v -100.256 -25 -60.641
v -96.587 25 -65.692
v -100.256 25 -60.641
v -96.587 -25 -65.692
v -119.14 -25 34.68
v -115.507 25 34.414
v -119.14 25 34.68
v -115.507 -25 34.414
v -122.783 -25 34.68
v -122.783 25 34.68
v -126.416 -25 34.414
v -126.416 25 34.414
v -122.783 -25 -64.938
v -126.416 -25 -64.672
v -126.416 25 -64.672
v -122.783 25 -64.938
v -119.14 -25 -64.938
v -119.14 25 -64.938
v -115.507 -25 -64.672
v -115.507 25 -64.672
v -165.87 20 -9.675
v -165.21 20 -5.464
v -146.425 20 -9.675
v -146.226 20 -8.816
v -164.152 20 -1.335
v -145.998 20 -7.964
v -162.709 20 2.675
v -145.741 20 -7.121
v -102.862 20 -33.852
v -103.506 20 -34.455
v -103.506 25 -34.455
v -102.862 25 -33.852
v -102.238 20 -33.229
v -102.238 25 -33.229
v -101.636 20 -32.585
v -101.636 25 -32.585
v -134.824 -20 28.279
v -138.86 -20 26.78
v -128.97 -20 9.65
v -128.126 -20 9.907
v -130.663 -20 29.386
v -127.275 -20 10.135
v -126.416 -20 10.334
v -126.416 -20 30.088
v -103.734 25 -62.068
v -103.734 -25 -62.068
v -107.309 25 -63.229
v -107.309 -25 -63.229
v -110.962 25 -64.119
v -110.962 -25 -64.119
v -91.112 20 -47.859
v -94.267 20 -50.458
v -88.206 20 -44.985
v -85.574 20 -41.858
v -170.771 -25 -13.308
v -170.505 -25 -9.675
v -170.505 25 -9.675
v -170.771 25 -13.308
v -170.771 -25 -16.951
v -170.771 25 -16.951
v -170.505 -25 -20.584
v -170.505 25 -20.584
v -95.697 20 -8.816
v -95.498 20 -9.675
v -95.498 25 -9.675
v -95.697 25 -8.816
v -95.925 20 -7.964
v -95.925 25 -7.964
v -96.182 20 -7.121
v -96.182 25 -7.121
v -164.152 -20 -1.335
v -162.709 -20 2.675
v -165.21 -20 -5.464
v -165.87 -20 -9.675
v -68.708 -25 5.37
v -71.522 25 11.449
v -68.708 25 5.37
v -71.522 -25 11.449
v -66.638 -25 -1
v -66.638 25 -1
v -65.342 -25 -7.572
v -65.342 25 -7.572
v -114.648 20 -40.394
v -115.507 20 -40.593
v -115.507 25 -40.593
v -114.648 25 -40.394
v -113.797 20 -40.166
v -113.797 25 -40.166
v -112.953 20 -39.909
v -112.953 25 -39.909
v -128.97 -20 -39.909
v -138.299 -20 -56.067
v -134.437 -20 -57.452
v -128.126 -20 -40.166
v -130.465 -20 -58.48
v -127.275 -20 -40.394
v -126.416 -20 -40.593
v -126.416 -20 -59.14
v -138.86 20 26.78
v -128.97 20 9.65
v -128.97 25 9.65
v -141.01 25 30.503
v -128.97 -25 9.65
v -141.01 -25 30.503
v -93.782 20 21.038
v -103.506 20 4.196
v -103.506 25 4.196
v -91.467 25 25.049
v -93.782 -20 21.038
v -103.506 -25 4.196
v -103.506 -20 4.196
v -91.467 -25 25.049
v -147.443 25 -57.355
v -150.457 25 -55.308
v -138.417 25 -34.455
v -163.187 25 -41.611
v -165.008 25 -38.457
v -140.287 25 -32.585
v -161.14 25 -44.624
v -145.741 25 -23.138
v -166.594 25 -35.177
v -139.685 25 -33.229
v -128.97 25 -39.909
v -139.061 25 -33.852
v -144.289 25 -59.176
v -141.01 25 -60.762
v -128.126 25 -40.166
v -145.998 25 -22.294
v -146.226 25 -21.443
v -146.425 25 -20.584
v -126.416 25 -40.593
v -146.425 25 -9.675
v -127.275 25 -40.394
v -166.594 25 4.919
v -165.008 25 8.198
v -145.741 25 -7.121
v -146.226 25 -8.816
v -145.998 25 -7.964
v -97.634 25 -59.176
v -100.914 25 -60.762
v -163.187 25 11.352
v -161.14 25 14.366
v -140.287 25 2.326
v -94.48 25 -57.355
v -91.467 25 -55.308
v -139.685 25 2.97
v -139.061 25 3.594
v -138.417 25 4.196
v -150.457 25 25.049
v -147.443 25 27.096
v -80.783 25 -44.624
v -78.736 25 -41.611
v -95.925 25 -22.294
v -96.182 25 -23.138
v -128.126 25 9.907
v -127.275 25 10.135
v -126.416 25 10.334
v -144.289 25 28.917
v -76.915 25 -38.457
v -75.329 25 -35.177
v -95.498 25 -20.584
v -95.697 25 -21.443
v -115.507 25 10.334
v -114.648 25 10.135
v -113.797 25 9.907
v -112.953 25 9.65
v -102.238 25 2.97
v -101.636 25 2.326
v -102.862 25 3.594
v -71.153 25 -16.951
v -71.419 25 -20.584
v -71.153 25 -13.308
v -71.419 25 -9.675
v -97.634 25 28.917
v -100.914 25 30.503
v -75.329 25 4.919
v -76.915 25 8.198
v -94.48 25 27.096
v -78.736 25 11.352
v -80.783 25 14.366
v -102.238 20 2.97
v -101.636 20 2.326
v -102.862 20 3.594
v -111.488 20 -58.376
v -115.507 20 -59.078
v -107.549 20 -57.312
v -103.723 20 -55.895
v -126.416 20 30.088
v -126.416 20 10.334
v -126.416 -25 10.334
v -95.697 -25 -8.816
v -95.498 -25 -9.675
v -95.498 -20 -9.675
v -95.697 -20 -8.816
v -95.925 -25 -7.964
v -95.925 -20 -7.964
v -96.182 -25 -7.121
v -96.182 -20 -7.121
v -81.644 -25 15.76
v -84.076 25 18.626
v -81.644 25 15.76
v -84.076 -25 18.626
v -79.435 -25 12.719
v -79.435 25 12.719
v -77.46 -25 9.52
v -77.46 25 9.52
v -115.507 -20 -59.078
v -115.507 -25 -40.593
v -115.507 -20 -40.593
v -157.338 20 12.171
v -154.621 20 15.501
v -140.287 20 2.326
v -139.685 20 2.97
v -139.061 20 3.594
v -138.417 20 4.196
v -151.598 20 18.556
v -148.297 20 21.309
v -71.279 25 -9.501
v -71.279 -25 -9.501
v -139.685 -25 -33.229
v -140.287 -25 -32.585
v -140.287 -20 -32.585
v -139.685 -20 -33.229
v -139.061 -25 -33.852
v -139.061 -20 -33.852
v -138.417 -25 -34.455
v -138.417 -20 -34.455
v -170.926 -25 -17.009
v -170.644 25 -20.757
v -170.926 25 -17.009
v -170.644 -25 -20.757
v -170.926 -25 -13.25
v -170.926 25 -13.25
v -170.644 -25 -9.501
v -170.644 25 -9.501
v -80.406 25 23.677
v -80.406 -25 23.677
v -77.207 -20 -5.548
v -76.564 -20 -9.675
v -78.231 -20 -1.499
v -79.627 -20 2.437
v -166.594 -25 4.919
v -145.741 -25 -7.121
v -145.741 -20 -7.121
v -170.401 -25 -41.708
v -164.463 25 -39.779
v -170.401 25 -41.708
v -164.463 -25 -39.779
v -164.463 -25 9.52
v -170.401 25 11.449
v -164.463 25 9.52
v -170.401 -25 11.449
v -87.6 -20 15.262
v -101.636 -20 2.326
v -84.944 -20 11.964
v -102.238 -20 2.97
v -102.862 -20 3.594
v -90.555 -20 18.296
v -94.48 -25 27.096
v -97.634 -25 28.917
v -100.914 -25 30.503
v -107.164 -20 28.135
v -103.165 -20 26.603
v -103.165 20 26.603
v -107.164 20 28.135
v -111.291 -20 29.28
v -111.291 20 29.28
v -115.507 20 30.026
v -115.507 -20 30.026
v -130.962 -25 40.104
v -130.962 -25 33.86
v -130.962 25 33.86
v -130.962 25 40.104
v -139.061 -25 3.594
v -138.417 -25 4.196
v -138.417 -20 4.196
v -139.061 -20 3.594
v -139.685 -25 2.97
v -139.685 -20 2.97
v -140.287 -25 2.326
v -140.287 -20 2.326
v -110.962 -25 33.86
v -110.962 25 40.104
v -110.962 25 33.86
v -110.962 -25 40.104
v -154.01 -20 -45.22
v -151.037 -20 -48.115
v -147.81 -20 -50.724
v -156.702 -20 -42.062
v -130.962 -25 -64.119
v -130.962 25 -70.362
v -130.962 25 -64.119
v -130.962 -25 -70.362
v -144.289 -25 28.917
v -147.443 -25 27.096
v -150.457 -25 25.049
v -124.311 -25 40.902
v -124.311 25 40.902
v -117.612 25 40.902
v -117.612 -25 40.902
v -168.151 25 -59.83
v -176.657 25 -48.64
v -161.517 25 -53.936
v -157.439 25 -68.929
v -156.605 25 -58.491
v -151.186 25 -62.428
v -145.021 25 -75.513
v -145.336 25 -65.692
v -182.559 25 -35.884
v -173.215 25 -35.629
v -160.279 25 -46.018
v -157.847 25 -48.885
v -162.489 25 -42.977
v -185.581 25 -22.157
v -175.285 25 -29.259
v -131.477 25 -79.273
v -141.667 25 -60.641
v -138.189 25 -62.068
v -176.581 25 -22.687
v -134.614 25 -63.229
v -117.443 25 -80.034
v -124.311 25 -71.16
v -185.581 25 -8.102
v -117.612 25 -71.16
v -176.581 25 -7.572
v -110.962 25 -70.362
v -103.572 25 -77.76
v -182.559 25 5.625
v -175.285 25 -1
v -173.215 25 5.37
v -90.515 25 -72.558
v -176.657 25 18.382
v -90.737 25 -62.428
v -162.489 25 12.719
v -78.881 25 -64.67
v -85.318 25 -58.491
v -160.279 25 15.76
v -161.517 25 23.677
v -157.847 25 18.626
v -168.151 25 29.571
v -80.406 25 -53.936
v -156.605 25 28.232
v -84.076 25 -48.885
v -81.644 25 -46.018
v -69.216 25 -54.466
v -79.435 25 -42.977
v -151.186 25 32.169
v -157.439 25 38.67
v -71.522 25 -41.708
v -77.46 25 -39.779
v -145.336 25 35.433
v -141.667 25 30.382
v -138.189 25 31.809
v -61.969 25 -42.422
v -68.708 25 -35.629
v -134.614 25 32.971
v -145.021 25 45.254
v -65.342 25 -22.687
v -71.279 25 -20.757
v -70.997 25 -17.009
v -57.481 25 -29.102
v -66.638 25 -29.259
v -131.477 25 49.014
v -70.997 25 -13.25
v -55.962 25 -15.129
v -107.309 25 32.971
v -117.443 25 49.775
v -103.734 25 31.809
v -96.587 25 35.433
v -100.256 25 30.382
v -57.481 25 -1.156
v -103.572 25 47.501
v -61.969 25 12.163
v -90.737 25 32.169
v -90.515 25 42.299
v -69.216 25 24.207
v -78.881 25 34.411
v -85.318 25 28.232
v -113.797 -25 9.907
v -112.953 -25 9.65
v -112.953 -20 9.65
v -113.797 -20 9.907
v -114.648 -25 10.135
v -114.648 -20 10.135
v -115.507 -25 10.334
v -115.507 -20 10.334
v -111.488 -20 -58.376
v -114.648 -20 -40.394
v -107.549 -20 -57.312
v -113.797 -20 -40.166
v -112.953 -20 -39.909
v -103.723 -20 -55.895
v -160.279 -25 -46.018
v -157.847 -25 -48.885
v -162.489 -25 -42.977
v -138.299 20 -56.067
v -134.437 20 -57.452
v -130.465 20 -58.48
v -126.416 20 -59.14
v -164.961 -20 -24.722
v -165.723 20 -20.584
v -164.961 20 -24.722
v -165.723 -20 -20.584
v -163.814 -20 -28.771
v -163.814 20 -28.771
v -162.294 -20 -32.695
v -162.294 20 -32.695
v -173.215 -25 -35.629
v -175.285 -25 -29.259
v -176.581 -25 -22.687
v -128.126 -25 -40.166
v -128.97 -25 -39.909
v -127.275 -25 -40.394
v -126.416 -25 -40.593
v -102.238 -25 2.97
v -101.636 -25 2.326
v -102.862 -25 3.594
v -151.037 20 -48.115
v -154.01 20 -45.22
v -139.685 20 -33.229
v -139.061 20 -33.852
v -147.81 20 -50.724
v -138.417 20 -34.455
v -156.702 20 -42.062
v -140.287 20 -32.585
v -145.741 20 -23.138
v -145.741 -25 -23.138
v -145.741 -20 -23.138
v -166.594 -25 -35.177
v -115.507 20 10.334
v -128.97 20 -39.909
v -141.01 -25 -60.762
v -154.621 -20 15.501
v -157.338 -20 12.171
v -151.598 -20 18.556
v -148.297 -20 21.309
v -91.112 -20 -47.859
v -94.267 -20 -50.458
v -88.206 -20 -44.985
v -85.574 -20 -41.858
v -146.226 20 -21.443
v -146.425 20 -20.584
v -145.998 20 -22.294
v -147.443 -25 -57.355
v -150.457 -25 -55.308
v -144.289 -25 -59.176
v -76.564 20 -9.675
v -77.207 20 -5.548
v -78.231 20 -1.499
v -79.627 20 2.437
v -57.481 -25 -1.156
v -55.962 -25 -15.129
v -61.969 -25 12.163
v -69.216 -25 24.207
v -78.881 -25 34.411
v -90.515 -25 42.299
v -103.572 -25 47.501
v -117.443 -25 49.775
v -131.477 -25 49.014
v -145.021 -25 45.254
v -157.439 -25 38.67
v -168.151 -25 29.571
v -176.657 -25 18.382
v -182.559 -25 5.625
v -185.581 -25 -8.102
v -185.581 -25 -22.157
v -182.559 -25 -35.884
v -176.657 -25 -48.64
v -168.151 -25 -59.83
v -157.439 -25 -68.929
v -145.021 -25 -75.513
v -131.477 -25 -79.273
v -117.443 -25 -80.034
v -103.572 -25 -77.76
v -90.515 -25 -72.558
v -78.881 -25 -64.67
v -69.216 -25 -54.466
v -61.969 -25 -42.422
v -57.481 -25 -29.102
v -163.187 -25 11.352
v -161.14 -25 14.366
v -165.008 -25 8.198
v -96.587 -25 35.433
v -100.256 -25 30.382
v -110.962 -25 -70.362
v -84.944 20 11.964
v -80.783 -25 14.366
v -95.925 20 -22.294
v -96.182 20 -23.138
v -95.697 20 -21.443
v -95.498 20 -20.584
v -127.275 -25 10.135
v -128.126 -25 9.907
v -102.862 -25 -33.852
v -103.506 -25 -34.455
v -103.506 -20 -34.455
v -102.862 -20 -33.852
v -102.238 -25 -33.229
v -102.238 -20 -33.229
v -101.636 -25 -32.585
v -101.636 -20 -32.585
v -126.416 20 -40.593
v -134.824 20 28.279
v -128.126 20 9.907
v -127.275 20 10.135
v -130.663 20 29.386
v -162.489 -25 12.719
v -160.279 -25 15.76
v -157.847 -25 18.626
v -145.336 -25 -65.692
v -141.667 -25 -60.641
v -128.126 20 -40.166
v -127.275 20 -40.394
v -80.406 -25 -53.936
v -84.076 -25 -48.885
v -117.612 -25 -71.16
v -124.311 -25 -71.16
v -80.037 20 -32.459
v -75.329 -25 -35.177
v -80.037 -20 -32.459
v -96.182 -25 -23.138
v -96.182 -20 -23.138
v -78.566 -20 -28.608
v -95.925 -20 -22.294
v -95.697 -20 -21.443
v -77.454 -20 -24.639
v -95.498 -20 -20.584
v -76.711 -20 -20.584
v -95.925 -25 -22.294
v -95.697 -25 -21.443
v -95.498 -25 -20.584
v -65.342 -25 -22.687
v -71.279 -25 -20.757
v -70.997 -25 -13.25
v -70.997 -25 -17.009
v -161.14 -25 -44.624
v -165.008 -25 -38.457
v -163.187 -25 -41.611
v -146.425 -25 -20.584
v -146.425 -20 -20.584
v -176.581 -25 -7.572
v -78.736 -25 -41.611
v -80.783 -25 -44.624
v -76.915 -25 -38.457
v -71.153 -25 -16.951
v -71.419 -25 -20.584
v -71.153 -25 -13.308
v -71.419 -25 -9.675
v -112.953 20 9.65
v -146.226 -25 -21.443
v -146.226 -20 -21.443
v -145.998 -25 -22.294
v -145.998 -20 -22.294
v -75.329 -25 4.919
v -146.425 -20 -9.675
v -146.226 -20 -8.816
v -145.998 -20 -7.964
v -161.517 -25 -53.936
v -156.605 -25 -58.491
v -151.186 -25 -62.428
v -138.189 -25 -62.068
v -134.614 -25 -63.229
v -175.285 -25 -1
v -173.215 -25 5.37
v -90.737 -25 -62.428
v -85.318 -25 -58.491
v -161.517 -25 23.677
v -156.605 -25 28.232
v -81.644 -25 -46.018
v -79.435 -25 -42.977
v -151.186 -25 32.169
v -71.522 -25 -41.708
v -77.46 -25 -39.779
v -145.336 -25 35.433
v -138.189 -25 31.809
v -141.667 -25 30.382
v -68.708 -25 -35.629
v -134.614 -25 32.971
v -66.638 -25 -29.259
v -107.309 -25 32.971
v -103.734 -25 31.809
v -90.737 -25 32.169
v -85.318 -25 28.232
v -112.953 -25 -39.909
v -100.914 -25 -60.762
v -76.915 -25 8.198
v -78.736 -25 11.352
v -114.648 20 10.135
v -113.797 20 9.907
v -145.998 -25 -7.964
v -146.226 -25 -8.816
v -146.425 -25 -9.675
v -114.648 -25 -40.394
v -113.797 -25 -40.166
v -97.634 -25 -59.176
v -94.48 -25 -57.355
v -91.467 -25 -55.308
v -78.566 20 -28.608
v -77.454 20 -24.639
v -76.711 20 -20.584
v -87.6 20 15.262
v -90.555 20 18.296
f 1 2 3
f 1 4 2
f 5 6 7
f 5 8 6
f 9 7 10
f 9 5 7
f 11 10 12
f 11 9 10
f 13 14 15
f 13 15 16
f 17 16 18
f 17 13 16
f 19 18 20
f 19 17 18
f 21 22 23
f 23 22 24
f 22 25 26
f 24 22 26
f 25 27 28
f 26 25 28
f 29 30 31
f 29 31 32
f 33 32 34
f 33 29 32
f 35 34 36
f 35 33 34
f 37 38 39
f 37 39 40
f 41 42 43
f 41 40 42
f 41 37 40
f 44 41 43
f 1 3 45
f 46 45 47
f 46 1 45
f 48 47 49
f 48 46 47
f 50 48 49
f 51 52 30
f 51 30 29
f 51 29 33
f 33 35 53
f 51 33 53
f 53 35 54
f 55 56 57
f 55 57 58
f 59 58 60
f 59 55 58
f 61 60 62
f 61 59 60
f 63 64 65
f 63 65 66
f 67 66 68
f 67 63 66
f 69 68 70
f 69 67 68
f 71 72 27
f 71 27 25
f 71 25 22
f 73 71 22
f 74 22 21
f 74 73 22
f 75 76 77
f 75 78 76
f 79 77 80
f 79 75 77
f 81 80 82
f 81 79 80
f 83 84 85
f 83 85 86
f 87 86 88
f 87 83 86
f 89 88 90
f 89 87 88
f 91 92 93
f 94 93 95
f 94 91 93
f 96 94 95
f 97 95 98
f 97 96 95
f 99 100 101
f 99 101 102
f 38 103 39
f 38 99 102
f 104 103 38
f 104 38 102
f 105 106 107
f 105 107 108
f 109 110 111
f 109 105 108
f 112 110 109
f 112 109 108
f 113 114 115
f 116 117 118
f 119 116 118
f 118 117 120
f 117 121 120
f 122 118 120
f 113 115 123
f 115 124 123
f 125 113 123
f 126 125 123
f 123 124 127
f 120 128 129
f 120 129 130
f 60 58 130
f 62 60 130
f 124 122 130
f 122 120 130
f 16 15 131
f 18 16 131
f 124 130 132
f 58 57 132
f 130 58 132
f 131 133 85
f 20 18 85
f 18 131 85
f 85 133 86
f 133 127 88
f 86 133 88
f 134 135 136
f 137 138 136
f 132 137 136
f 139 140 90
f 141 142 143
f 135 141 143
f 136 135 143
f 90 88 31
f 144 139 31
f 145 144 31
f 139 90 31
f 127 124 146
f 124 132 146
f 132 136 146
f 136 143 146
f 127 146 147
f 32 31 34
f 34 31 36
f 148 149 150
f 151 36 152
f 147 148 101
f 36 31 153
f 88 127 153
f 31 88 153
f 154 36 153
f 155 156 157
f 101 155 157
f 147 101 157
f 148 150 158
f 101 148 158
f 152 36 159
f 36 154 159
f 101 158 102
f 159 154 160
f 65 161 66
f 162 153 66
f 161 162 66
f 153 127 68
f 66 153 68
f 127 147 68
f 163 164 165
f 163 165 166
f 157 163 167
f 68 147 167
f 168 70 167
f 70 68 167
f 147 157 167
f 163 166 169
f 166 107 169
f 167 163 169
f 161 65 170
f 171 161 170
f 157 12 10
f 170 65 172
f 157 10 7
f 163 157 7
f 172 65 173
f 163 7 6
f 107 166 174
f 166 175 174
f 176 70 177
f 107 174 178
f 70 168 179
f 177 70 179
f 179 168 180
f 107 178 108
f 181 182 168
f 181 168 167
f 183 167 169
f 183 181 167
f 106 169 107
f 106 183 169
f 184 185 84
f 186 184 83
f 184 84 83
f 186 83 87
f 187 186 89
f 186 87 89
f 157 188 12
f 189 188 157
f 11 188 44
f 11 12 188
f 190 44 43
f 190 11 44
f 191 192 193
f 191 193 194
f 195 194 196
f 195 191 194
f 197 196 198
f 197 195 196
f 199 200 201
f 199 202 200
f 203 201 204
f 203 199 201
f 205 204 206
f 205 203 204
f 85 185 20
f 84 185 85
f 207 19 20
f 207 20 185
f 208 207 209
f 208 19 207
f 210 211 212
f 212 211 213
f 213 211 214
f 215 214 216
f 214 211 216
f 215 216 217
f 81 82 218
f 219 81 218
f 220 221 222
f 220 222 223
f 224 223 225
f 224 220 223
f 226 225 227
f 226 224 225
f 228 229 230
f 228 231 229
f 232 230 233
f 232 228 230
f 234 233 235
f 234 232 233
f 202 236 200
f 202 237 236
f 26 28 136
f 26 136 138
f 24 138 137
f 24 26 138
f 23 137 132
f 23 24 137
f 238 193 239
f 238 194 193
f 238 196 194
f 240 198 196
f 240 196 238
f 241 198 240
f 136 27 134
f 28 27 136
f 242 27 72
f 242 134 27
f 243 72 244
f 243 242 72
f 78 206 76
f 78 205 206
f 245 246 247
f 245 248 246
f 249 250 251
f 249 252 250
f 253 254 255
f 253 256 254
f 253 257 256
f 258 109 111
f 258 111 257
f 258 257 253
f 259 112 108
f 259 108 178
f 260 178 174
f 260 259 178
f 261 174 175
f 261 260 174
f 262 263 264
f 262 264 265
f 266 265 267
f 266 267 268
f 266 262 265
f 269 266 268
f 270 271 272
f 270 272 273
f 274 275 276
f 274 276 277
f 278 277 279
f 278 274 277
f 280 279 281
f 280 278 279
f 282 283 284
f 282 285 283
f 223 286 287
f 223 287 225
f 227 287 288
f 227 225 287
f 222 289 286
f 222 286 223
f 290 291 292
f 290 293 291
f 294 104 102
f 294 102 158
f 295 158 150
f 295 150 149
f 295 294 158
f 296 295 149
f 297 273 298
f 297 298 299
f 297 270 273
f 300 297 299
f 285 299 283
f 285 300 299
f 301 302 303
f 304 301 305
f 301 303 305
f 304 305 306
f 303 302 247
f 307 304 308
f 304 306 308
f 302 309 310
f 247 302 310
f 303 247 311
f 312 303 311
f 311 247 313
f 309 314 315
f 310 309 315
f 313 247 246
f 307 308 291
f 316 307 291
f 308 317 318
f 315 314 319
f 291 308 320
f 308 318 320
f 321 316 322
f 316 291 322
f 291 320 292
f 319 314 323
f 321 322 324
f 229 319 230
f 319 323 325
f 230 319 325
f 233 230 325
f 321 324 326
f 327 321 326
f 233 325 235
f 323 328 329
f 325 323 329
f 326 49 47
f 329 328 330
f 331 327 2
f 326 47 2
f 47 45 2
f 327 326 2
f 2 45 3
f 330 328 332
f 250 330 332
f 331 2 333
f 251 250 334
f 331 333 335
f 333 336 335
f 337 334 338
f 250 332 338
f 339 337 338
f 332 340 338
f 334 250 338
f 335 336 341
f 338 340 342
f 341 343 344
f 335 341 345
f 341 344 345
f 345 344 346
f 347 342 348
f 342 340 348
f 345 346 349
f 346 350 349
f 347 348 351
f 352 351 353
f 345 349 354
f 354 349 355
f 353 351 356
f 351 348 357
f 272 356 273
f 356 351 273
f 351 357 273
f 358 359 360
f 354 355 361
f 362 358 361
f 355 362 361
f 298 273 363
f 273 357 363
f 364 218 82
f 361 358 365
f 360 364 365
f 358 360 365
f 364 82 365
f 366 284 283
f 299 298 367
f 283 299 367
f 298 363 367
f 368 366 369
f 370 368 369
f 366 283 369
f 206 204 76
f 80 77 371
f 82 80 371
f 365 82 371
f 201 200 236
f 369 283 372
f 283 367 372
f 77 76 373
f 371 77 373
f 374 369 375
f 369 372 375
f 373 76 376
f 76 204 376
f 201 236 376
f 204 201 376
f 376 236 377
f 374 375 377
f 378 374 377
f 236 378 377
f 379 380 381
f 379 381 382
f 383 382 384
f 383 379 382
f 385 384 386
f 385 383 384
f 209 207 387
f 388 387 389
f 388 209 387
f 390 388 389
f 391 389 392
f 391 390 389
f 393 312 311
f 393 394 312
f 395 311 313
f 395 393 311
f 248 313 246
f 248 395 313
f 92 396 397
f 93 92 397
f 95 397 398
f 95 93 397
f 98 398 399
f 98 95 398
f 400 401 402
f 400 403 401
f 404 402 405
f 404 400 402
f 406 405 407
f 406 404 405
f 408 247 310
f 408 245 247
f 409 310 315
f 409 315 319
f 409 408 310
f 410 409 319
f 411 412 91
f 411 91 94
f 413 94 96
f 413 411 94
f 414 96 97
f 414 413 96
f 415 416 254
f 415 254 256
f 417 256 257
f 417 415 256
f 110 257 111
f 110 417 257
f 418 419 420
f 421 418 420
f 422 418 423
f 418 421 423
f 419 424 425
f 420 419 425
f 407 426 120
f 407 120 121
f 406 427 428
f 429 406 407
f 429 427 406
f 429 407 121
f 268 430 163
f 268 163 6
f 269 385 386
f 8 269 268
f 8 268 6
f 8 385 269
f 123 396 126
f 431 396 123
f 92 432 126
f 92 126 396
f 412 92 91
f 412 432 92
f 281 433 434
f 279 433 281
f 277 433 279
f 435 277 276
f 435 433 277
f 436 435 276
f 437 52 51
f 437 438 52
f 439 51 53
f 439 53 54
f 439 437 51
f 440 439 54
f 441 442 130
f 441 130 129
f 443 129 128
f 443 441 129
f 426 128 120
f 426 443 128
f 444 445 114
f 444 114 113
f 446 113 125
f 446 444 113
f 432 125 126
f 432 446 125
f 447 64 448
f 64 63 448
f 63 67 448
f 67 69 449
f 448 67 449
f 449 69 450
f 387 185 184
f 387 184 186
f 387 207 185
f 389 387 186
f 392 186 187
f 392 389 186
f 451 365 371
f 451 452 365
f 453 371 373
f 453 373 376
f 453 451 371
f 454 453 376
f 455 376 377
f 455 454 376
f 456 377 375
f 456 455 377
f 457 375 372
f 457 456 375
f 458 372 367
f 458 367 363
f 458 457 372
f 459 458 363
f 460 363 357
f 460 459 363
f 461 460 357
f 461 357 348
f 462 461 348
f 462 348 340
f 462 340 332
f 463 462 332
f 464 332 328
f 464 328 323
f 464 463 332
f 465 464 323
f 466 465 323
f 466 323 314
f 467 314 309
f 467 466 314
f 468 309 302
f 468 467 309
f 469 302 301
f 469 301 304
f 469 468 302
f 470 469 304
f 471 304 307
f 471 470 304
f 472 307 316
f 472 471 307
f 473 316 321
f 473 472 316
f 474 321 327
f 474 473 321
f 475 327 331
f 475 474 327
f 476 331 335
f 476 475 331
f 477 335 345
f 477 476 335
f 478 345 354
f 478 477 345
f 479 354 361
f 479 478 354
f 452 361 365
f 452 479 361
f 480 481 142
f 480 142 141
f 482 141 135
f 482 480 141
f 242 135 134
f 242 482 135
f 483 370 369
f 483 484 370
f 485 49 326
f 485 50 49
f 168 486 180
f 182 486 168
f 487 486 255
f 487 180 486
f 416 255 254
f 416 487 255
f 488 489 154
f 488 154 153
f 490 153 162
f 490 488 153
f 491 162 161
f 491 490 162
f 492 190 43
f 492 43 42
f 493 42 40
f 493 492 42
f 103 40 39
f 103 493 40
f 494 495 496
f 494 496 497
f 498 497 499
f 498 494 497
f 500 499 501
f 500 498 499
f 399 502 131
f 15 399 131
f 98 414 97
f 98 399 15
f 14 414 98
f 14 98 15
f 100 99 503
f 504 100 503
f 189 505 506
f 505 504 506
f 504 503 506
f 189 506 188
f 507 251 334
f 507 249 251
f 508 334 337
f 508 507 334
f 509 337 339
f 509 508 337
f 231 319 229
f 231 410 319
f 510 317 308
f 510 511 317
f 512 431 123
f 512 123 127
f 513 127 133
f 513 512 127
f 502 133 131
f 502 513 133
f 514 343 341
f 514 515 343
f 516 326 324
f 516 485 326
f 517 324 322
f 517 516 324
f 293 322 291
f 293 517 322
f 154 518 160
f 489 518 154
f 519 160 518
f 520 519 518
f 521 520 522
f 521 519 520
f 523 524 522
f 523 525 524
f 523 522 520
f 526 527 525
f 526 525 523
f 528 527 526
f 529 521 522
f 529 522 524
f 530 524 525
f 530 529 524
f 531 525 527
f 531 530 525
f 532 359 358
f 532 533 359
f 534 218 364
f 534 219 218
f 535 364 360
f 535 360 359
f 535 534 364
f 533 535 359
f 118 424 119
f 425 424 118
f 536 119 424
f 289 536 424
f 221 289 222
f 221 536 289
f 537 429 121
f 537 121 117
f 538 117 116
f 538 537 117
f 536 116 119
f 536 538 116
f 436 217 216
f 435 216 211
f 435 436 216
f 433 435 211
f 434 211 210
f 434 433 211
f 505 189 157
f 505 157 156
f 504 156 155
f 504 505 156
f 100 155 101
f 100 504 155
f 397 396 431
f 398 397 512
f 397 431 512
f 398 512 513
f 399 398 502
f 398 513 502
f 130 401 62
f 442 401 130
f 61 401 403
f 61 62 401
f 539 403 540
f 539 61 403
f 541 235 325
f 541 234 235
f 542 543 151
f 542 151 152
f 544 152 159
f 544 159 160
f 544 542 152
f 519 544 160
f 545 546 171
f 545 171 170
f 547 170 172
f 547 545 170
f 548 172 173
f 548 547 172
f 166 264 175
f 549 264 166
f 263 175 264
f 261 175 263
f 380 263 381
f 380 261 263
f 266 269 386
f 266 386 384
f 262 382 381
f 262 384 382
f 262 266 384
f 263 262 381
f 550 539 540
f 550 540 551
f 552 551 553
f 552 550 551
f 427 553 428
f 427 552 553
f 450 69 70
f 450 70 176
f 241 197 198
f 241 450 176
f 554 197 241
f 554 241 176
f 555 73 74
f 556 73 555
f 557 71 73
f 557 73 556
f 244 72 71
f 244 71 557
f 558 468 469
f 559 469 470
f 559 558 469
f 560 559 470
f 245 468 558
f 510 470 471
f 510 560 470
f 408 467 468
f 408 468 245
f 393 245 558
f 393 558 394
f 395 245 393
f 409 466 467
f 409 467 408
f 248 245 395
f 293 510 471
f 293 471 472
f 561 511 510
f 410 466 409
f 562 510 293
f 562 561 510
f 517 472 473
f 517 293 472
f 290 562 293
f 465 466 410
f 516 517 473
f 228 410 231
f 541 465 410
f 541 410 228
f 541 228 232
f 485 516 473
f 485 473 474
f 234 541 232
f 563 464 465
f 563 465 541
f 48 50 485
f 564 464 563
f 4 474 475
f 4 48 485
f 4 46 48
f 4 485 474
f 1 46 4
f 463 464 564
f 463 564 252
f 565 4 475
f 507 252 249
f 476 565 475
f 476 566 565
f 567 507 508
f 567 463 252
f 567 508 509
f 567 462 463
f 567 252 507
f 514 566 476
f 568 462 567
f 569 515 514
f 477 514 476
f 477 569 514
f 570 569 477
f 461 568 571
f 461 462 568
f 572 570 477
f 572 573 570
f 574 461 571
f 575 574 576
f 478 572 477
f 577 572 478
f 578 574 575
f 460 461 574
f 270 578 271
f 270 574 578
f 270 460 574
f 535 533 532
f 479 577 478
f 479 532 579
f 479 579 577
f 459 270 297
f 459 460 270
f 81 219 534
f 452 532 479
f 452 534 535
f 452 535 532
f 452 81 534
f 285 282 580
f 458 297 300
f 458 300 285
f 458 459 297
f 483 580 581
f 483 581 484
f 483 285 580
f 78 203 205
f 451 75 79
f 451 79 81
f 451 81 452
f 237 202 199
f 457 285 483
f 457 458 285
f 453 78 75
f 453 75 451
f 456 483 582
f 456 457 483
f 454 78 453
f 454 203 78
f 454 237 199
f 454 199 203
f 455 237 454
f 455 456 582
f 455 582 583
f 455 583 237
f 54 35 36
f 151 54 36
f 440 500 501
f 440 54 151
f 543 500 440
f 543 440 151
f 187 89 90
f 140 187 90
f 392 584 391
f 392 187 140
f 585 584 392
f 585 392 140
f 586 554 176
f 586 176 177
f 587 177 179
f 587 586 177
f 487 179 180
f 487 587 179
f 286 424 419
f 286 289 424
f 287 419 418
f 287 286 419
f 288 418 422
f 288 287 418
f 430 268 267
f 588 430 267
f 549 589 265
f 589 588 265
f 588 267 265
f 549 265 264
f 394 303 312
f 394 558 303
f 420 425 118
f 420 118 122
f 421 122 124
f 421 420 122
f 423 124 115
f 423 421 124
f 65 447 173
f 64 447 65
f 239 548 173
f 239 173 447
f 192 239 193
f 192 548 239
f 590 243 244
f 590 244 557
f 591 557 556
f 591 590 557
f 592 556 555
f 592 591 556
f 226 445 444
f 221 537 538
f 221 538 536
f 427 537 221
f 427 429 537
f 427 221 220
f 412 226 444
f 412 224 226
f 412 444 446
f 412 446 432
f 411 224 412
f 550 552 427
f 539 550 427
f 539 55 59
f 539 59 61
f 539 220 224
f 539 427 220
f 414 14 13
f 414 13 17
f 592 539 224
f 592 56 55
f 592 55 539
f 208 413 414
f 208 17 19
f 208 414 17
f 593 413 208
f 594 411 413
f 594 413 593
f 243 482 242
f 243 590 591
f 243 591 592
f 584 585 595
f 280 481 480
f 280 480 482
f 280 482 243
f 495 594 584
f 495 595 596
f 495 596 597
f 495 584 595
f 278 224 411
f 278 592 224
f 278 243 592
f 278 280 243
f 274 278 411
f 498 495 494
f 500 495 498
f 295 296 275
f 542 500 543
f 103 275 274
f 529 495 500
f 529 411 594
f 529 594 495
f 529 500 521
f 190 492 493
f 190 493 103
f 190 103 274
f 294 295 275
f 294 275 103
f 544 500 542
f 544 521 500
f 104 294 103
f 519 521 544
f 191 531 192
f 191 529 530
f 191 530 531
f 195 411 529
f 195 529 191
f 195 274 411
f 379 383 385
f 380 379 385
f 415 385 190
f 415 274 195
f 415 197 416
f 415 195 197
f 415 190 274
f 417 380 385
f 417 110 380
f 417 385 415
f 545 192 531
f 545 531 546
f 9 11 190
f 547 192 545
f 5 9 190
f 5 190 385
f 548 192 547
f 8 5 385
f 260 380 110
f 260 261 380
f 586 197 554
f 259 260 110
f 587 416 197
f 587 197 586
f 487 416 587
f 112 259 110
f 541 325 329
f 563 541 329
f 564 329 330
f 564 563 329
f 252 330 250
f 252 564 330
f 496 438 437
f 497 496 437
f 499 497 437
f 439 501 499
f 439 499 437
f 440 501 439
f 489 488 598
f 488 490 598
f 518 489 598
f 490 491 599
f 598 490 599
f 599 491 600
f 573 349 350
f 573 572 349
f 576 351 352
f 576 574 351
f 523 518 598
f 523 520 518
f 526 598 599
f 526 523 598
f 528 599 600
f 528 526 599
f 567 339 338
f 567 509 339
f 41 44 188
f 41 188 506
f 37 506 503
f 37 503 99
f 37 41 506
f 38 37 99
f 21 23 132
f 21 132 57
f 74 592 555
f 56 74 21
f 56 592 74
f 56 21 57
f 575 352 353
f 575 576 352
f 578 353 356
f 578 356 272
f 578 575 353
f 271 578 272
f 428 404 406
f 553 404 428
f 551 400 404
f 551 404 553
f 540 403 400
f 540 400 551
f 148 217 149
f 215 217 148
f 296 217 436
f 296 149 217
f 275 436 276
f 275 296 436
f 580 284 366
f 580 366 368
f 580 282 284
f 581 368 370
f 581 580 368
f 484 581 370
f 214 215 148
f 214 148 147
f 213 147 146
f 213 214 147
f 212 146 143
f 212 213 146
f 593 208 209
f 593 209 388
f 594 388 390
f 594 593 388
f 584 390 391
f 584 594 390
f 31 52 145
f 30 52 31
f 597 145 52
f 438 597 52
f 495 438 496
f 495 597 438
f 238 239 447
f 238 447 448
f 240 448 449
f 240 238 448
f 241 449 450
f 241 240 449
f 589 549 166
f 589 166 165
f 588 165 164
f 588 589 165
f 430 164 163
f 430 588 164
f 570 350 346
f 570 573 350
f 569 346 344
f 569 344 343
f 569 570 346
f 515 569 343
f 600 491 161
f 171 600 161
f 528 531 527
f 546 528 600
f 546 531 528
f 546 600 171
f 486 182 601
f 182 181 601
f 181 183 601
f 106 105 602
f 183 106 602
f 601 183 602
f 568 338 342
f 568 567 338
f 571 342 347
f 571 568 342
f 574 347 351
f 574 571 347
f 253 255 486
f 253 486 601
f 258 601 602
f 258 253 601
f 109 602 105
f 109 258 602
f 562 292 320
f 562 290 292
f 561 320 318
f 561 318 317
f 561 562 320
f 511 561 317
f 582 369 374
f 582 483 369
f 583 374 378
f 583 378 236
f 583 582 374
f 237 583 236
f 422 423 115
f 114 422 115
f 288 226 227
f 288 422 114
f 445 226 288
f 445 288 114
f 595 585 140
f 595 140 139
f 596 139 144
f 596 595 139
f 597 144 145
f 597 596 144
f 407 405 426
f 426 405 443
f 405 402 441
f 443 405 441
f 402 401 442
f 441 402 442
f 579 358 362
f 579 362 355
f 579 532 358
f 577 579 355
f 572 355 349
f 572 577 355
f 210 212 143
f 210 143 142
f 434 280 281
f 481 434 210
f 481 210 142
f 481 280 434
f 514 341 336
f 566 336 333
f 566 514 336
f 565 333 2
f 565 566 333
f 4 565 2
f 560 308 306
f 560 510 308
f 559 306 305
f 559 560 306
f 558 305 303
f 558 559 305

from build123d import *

# Parameters (mm, degrees)
F0_R     = 65
F2_DEPTH = 25
F3_DEPTH = 25
F1_R     = 44.916046
F4_DEPTH = 20


with BuildPart() as f2:
    # F0 (on Front) → F2 (new body, symmetric)
    with BuildSketch(Plane.XZ):
        with Locations((-120.961553, -15.129341)):
            Circle(F0_R)
        with BuildLine():
            Line((-130.961553, 33.860454), (-130.961553, 40.103608))
            ThreePointArc((-130.961553, 40.103608), (-120.961553, 41.001566), (-110.961553, 40.103608))
            Line((-110.961553, 40.103608), (-110.961553, 33.860454))
            ThreePointArc((-110.961553, 33.860454), (-105.510703, 32.423485), (-100.256244, 30.382088))
            Line((-100.256244, 30.382088), (-96.58661, 35.432906))
            ThreePointArc((-96.58661, 35.432906), (-87.968634, 30.281516), (-80.40627, 23.677201))
            Line((-80.40627, 23.677201), (-84.075904, 18.626383))
            ThreePointArc((-84.075904, 18.626383), (-80.510703, 14.259922), (-77.45966, 9.519904))
            Line((-77.45966, 9.519904), (-71.522067, 11.449144))
            ThreePointArc((-71.522067, 11.449144), (-67.577889, 2.216063), (-65.341727, -7.571986))
            Line((-65.341727, -7.571986), (-71.27932, -9.501227))
            ThreePointArc((-71.27932, -9.501227), (-70.961553, -15.129341), (-71.27932, -20.757455))
            Line((-71.27932, -20.757455), (-65.341727, -22.686696))
            ThreePointArc((-65.341727, -22.686696), (-67.577889, -32.474745), (-71.522067, -41.707826))
            Line((-71.522067, -41.707826), (-77.45966, -39.778585))
            ThreePointArc((-77.45966, -39.778585), (-80.510703, -44.518603), (-84.075904, -48.885065))
            Line((-84.075904, -48.885065), (-80.40627, -53.935883))
            ThreePointArc((-80.40627, -53.935883), (-87.968634, -60.540198), (-96.58661, -65.691588))
            Line((-96.58661, -65.691588), (-100.256244, -60.64077))
            ThreePointArc((-100.256244, -60.64077), (-105.510703, -62.682167), (-110.961553, -64.119136))
            Line((-110.961553, -64.119136), (-110.961553, -70.36229))
            ThreePointArc((-110.961553, -70.36229), (-120.961553, -71.260247), (-130.961553, -70.36229))
            Line((-130.961553, -70.36229), (-130.961553, -64.119136))
            ThreePointArc((-130.961553, -64.119136), (-136.412403, -62.682167), (-141.666862, -60.64077))
            Line((-141.666862, -60.64077), (-145.336496, -65.691588))
            ThreePointArc((-145.336496, -65.691588), (-153.954472, -60.540198), (-161.516836, -53.935883))
            Line((-161.516836, -53.935883), (-157.847202, -48.885065))
            ThreePointArc((-157.847202, -48.885065), (-161.412403, -44.518603), (-164.463447, -39.778585))
            Line((-164.463447, -39.778585), (-170.401039, -41.707826))
            ThreePointArc((-170.401039, -41.707826), (-174.345218, -32.474745), (-176.581379, -22.686696))
            Line((-176.581379, -22.686696), (-170.643787, -20.757455))
            ThreePointArc((-170.643787, -20.757455), (-170.961553, -15.129341), (-170.643787, -9.501227))
            Line((-170.643787, -9.501227), (-176.581379, -7.571986))
            ThreePointArc((-176.581379, -7.571986), (-174.345218, 2.216063), (-170.401039, 11.449144))
            Line((-170.401039, 11.449144), (-164.463447, 9.519904))
            ThreePointArc((-164.463447, 9.519904), (-161.412403, 14.259922), (-157.847202, 18.626383))
            Line((-157.847202, 18.626383), (-161.516836, 23.677201))
            ThreePointArc((-161.516836, 23.677201), (-153.954472, 30.281516), (-145.336496, 35.432906))
            Line((-145.336496, 35.432906), (-141.666862, 30.382088))
            ThreePointArc((-141.666862, 30.382088), (-136.412403, 32.423485), (-130.961553, 33.860454))
        make_face(mode=Mode.SUBTRACT)
    extrude(amount=F2_DEPTH, both=True)


with BuildPart() as f3:
    # F0 (on Front) → F3 (new body, symmetric)
    with BuildSketch(Plane.XZ):
        with BuildLine():
            Line((-126.415759, 34.413607), (-126.415759, 32.423485))
            Line((-126.415759, 32.423485), (-126.415759, 10.334424))
            ThreePointArc((-126.415759, 10.334424), (-127.701549, 10.024668), (-128.969955, 9.65003))
            Line((-128.969955, 9.65003), (-141.009546, 30.503213))
            ThreePointArc((-141.009546, 30.503213), (-145.882689, 28.035332), (-150.456508, 25.049007))
            Line((-150.456508, 25.049007), (-138.416917, 4.195824))
            ThreePointArc((-138.416917, 4.195824), (-139.375565, 3.284671), (-140.286718, 2.326023))
            Line((-140.286718, 2.326023), (-161.139901, 14.365614))
            ThreePointArc((-161.139901, 14.365614), (-164.126226, 9.791795), (-166.594107, 4.918652))
            Line((-166.594107, 4.918652), (-145.740924, -7.120939))
            ThreePointArc((-145.740924, -7.120939), (-146.115562, -8.389345), (-146.425318, -9.675135))
            Line((-146.425318, -9.675135), (-170.504501, -9.675135))
            ThreePointArc((-170.504501, -9.675135), (-170.803824, -15.129341), (-170.504501, -20.583547))
            Line((-170.504501, -20.583547), (-146.425318, -20.583547))
            ThreePointArc((-146.425318, -20.583547), (-146.115562, -21.869337), (-145.740924, -23.137742))
            Line((-145.740924, -23.137742), (-166.594107, -35.177333))
            ThreePointArc((-166.594107, -35.177333), (-164.126226, -40.050476), (-161.139901, -44.624296))
            Line((-161.139901, -44.624296), (-140.286718, -32.584704))
            ThreePointArc((-140.286718, -32.584704), (-139.375565, -33.543353), (-138.416917, -34.454505))
            Line((-138.416917, -34.454505), (-150.456508, -55.307689))
            ThreePointArc((-150.456508, -55.307689), (-145.882689, -58.294014), (-141.009546, -60.761895))
            Line((-141.009546, -60.761895), (-128.969955, -39.908711))
            ThreePointArc((-128.969955, -39.908711), (-127.701549, -40.283349), (-126.415759, -40.593106))
            Line((-126.415759, -40.593106), (-126.415759, -64.672288))
            ThreePointArc((-126.415759, -64.672288), (-120.961553, -64.971612), (-115.507347, -64.672288))
            Line((-115.507347, -64.672288), (-115.507347, -40.593106))
            ThreePointArc((-115.507347, -40.593106), (-114.221557, -40.283349), (-112.953152, -39.908711))
            Line((-112.953152, -39.908711), (-100.913561, -60.761895))
            ThreePointArc((-100.913561, -60.761895), (-96.040418, -58.294014), (-91.466598, -55.307689))
            Line((-91.466598, -55.307689), (-103.50619, -34.454505))
            ThreePointArc((-103.50619, -34.454505), (-102.547541, -33.543353), (-101.636389, -32.584704))
            Line((-101.636389, -32.584704), (-80.783205, -44.624296))
            ThreePointArc((-80.783205, -44.624296), (-77.79688, -40.050476), (-75.328999, -35.177333))
            Line((-75.328999, -35.177333), (-96.182183, -23.137742))
            ThreePointArc((-96.182183, -23.137742), (-95.807545, -21.869337), (-95.497788, -20.583547))
            Line((-95.497788, -20.583547), (-71.418606, -20.583547))
            ThreePointArc((-71.418606, -20.583547), (-71.119282, -15.129341), (-71.418606, -9.675135))
            Line((-71.418606, -9.675135), (-95.497788, -9.675135))
            ThreePointArc((-95.497788, -9.675135), (-95.807545, -8.389345), (-96.182183, -7.120939))
            Line((-96.182183, -7.120939), (-75.328999, 4.918652))
            ThreePointArc((-75.328999, 4.918652), (-77.79688, 9.791795), (-80.783205, 14.365614))
            Line((-80.783205, 14.365614), (-101.636389, 2.326023))
            ThreePointArc((-101.636389, 2.326023), (-102.547541, 3.284671), (-103.50619, 4.195824))
            Line((-103.50619, 4.195824), (-91.466598, 25.049007))
            ThreePointArc((-91.466598, 25.049007), (-96.040418, 28.035332), (-100.913561, 30.503213))
            Line((-100.913561, 30.503213), (-112.953152, 9.65003))
            ThreePointArc((-112.953152, 9.65003), (-114.221557, 10.024668), (-115.507347, 10.334424))
            Line((-115.507347, 10.334424), (-115.507347, 32.423485))
            Line((-115.507347, 32.423485), (-115.507347, 34.413607))
            ThreePointArc((-115.507347, 34.413607), (-120.961553, 34.71293), (-126.415759, 34.413607))
        make_face()
    extrude(amount=F3_DEPTH, both=True)

    # F1 (on Front) → F4 (join, symmetric)
    with BuildSketch(Plane.XZ):
        with Locations((-121.217057, -14.525875)):
            Circle(F1_R)
    extrude(amount=F4_DEPTH, both=True)


solid = Compound([f2.part, f3.part])
